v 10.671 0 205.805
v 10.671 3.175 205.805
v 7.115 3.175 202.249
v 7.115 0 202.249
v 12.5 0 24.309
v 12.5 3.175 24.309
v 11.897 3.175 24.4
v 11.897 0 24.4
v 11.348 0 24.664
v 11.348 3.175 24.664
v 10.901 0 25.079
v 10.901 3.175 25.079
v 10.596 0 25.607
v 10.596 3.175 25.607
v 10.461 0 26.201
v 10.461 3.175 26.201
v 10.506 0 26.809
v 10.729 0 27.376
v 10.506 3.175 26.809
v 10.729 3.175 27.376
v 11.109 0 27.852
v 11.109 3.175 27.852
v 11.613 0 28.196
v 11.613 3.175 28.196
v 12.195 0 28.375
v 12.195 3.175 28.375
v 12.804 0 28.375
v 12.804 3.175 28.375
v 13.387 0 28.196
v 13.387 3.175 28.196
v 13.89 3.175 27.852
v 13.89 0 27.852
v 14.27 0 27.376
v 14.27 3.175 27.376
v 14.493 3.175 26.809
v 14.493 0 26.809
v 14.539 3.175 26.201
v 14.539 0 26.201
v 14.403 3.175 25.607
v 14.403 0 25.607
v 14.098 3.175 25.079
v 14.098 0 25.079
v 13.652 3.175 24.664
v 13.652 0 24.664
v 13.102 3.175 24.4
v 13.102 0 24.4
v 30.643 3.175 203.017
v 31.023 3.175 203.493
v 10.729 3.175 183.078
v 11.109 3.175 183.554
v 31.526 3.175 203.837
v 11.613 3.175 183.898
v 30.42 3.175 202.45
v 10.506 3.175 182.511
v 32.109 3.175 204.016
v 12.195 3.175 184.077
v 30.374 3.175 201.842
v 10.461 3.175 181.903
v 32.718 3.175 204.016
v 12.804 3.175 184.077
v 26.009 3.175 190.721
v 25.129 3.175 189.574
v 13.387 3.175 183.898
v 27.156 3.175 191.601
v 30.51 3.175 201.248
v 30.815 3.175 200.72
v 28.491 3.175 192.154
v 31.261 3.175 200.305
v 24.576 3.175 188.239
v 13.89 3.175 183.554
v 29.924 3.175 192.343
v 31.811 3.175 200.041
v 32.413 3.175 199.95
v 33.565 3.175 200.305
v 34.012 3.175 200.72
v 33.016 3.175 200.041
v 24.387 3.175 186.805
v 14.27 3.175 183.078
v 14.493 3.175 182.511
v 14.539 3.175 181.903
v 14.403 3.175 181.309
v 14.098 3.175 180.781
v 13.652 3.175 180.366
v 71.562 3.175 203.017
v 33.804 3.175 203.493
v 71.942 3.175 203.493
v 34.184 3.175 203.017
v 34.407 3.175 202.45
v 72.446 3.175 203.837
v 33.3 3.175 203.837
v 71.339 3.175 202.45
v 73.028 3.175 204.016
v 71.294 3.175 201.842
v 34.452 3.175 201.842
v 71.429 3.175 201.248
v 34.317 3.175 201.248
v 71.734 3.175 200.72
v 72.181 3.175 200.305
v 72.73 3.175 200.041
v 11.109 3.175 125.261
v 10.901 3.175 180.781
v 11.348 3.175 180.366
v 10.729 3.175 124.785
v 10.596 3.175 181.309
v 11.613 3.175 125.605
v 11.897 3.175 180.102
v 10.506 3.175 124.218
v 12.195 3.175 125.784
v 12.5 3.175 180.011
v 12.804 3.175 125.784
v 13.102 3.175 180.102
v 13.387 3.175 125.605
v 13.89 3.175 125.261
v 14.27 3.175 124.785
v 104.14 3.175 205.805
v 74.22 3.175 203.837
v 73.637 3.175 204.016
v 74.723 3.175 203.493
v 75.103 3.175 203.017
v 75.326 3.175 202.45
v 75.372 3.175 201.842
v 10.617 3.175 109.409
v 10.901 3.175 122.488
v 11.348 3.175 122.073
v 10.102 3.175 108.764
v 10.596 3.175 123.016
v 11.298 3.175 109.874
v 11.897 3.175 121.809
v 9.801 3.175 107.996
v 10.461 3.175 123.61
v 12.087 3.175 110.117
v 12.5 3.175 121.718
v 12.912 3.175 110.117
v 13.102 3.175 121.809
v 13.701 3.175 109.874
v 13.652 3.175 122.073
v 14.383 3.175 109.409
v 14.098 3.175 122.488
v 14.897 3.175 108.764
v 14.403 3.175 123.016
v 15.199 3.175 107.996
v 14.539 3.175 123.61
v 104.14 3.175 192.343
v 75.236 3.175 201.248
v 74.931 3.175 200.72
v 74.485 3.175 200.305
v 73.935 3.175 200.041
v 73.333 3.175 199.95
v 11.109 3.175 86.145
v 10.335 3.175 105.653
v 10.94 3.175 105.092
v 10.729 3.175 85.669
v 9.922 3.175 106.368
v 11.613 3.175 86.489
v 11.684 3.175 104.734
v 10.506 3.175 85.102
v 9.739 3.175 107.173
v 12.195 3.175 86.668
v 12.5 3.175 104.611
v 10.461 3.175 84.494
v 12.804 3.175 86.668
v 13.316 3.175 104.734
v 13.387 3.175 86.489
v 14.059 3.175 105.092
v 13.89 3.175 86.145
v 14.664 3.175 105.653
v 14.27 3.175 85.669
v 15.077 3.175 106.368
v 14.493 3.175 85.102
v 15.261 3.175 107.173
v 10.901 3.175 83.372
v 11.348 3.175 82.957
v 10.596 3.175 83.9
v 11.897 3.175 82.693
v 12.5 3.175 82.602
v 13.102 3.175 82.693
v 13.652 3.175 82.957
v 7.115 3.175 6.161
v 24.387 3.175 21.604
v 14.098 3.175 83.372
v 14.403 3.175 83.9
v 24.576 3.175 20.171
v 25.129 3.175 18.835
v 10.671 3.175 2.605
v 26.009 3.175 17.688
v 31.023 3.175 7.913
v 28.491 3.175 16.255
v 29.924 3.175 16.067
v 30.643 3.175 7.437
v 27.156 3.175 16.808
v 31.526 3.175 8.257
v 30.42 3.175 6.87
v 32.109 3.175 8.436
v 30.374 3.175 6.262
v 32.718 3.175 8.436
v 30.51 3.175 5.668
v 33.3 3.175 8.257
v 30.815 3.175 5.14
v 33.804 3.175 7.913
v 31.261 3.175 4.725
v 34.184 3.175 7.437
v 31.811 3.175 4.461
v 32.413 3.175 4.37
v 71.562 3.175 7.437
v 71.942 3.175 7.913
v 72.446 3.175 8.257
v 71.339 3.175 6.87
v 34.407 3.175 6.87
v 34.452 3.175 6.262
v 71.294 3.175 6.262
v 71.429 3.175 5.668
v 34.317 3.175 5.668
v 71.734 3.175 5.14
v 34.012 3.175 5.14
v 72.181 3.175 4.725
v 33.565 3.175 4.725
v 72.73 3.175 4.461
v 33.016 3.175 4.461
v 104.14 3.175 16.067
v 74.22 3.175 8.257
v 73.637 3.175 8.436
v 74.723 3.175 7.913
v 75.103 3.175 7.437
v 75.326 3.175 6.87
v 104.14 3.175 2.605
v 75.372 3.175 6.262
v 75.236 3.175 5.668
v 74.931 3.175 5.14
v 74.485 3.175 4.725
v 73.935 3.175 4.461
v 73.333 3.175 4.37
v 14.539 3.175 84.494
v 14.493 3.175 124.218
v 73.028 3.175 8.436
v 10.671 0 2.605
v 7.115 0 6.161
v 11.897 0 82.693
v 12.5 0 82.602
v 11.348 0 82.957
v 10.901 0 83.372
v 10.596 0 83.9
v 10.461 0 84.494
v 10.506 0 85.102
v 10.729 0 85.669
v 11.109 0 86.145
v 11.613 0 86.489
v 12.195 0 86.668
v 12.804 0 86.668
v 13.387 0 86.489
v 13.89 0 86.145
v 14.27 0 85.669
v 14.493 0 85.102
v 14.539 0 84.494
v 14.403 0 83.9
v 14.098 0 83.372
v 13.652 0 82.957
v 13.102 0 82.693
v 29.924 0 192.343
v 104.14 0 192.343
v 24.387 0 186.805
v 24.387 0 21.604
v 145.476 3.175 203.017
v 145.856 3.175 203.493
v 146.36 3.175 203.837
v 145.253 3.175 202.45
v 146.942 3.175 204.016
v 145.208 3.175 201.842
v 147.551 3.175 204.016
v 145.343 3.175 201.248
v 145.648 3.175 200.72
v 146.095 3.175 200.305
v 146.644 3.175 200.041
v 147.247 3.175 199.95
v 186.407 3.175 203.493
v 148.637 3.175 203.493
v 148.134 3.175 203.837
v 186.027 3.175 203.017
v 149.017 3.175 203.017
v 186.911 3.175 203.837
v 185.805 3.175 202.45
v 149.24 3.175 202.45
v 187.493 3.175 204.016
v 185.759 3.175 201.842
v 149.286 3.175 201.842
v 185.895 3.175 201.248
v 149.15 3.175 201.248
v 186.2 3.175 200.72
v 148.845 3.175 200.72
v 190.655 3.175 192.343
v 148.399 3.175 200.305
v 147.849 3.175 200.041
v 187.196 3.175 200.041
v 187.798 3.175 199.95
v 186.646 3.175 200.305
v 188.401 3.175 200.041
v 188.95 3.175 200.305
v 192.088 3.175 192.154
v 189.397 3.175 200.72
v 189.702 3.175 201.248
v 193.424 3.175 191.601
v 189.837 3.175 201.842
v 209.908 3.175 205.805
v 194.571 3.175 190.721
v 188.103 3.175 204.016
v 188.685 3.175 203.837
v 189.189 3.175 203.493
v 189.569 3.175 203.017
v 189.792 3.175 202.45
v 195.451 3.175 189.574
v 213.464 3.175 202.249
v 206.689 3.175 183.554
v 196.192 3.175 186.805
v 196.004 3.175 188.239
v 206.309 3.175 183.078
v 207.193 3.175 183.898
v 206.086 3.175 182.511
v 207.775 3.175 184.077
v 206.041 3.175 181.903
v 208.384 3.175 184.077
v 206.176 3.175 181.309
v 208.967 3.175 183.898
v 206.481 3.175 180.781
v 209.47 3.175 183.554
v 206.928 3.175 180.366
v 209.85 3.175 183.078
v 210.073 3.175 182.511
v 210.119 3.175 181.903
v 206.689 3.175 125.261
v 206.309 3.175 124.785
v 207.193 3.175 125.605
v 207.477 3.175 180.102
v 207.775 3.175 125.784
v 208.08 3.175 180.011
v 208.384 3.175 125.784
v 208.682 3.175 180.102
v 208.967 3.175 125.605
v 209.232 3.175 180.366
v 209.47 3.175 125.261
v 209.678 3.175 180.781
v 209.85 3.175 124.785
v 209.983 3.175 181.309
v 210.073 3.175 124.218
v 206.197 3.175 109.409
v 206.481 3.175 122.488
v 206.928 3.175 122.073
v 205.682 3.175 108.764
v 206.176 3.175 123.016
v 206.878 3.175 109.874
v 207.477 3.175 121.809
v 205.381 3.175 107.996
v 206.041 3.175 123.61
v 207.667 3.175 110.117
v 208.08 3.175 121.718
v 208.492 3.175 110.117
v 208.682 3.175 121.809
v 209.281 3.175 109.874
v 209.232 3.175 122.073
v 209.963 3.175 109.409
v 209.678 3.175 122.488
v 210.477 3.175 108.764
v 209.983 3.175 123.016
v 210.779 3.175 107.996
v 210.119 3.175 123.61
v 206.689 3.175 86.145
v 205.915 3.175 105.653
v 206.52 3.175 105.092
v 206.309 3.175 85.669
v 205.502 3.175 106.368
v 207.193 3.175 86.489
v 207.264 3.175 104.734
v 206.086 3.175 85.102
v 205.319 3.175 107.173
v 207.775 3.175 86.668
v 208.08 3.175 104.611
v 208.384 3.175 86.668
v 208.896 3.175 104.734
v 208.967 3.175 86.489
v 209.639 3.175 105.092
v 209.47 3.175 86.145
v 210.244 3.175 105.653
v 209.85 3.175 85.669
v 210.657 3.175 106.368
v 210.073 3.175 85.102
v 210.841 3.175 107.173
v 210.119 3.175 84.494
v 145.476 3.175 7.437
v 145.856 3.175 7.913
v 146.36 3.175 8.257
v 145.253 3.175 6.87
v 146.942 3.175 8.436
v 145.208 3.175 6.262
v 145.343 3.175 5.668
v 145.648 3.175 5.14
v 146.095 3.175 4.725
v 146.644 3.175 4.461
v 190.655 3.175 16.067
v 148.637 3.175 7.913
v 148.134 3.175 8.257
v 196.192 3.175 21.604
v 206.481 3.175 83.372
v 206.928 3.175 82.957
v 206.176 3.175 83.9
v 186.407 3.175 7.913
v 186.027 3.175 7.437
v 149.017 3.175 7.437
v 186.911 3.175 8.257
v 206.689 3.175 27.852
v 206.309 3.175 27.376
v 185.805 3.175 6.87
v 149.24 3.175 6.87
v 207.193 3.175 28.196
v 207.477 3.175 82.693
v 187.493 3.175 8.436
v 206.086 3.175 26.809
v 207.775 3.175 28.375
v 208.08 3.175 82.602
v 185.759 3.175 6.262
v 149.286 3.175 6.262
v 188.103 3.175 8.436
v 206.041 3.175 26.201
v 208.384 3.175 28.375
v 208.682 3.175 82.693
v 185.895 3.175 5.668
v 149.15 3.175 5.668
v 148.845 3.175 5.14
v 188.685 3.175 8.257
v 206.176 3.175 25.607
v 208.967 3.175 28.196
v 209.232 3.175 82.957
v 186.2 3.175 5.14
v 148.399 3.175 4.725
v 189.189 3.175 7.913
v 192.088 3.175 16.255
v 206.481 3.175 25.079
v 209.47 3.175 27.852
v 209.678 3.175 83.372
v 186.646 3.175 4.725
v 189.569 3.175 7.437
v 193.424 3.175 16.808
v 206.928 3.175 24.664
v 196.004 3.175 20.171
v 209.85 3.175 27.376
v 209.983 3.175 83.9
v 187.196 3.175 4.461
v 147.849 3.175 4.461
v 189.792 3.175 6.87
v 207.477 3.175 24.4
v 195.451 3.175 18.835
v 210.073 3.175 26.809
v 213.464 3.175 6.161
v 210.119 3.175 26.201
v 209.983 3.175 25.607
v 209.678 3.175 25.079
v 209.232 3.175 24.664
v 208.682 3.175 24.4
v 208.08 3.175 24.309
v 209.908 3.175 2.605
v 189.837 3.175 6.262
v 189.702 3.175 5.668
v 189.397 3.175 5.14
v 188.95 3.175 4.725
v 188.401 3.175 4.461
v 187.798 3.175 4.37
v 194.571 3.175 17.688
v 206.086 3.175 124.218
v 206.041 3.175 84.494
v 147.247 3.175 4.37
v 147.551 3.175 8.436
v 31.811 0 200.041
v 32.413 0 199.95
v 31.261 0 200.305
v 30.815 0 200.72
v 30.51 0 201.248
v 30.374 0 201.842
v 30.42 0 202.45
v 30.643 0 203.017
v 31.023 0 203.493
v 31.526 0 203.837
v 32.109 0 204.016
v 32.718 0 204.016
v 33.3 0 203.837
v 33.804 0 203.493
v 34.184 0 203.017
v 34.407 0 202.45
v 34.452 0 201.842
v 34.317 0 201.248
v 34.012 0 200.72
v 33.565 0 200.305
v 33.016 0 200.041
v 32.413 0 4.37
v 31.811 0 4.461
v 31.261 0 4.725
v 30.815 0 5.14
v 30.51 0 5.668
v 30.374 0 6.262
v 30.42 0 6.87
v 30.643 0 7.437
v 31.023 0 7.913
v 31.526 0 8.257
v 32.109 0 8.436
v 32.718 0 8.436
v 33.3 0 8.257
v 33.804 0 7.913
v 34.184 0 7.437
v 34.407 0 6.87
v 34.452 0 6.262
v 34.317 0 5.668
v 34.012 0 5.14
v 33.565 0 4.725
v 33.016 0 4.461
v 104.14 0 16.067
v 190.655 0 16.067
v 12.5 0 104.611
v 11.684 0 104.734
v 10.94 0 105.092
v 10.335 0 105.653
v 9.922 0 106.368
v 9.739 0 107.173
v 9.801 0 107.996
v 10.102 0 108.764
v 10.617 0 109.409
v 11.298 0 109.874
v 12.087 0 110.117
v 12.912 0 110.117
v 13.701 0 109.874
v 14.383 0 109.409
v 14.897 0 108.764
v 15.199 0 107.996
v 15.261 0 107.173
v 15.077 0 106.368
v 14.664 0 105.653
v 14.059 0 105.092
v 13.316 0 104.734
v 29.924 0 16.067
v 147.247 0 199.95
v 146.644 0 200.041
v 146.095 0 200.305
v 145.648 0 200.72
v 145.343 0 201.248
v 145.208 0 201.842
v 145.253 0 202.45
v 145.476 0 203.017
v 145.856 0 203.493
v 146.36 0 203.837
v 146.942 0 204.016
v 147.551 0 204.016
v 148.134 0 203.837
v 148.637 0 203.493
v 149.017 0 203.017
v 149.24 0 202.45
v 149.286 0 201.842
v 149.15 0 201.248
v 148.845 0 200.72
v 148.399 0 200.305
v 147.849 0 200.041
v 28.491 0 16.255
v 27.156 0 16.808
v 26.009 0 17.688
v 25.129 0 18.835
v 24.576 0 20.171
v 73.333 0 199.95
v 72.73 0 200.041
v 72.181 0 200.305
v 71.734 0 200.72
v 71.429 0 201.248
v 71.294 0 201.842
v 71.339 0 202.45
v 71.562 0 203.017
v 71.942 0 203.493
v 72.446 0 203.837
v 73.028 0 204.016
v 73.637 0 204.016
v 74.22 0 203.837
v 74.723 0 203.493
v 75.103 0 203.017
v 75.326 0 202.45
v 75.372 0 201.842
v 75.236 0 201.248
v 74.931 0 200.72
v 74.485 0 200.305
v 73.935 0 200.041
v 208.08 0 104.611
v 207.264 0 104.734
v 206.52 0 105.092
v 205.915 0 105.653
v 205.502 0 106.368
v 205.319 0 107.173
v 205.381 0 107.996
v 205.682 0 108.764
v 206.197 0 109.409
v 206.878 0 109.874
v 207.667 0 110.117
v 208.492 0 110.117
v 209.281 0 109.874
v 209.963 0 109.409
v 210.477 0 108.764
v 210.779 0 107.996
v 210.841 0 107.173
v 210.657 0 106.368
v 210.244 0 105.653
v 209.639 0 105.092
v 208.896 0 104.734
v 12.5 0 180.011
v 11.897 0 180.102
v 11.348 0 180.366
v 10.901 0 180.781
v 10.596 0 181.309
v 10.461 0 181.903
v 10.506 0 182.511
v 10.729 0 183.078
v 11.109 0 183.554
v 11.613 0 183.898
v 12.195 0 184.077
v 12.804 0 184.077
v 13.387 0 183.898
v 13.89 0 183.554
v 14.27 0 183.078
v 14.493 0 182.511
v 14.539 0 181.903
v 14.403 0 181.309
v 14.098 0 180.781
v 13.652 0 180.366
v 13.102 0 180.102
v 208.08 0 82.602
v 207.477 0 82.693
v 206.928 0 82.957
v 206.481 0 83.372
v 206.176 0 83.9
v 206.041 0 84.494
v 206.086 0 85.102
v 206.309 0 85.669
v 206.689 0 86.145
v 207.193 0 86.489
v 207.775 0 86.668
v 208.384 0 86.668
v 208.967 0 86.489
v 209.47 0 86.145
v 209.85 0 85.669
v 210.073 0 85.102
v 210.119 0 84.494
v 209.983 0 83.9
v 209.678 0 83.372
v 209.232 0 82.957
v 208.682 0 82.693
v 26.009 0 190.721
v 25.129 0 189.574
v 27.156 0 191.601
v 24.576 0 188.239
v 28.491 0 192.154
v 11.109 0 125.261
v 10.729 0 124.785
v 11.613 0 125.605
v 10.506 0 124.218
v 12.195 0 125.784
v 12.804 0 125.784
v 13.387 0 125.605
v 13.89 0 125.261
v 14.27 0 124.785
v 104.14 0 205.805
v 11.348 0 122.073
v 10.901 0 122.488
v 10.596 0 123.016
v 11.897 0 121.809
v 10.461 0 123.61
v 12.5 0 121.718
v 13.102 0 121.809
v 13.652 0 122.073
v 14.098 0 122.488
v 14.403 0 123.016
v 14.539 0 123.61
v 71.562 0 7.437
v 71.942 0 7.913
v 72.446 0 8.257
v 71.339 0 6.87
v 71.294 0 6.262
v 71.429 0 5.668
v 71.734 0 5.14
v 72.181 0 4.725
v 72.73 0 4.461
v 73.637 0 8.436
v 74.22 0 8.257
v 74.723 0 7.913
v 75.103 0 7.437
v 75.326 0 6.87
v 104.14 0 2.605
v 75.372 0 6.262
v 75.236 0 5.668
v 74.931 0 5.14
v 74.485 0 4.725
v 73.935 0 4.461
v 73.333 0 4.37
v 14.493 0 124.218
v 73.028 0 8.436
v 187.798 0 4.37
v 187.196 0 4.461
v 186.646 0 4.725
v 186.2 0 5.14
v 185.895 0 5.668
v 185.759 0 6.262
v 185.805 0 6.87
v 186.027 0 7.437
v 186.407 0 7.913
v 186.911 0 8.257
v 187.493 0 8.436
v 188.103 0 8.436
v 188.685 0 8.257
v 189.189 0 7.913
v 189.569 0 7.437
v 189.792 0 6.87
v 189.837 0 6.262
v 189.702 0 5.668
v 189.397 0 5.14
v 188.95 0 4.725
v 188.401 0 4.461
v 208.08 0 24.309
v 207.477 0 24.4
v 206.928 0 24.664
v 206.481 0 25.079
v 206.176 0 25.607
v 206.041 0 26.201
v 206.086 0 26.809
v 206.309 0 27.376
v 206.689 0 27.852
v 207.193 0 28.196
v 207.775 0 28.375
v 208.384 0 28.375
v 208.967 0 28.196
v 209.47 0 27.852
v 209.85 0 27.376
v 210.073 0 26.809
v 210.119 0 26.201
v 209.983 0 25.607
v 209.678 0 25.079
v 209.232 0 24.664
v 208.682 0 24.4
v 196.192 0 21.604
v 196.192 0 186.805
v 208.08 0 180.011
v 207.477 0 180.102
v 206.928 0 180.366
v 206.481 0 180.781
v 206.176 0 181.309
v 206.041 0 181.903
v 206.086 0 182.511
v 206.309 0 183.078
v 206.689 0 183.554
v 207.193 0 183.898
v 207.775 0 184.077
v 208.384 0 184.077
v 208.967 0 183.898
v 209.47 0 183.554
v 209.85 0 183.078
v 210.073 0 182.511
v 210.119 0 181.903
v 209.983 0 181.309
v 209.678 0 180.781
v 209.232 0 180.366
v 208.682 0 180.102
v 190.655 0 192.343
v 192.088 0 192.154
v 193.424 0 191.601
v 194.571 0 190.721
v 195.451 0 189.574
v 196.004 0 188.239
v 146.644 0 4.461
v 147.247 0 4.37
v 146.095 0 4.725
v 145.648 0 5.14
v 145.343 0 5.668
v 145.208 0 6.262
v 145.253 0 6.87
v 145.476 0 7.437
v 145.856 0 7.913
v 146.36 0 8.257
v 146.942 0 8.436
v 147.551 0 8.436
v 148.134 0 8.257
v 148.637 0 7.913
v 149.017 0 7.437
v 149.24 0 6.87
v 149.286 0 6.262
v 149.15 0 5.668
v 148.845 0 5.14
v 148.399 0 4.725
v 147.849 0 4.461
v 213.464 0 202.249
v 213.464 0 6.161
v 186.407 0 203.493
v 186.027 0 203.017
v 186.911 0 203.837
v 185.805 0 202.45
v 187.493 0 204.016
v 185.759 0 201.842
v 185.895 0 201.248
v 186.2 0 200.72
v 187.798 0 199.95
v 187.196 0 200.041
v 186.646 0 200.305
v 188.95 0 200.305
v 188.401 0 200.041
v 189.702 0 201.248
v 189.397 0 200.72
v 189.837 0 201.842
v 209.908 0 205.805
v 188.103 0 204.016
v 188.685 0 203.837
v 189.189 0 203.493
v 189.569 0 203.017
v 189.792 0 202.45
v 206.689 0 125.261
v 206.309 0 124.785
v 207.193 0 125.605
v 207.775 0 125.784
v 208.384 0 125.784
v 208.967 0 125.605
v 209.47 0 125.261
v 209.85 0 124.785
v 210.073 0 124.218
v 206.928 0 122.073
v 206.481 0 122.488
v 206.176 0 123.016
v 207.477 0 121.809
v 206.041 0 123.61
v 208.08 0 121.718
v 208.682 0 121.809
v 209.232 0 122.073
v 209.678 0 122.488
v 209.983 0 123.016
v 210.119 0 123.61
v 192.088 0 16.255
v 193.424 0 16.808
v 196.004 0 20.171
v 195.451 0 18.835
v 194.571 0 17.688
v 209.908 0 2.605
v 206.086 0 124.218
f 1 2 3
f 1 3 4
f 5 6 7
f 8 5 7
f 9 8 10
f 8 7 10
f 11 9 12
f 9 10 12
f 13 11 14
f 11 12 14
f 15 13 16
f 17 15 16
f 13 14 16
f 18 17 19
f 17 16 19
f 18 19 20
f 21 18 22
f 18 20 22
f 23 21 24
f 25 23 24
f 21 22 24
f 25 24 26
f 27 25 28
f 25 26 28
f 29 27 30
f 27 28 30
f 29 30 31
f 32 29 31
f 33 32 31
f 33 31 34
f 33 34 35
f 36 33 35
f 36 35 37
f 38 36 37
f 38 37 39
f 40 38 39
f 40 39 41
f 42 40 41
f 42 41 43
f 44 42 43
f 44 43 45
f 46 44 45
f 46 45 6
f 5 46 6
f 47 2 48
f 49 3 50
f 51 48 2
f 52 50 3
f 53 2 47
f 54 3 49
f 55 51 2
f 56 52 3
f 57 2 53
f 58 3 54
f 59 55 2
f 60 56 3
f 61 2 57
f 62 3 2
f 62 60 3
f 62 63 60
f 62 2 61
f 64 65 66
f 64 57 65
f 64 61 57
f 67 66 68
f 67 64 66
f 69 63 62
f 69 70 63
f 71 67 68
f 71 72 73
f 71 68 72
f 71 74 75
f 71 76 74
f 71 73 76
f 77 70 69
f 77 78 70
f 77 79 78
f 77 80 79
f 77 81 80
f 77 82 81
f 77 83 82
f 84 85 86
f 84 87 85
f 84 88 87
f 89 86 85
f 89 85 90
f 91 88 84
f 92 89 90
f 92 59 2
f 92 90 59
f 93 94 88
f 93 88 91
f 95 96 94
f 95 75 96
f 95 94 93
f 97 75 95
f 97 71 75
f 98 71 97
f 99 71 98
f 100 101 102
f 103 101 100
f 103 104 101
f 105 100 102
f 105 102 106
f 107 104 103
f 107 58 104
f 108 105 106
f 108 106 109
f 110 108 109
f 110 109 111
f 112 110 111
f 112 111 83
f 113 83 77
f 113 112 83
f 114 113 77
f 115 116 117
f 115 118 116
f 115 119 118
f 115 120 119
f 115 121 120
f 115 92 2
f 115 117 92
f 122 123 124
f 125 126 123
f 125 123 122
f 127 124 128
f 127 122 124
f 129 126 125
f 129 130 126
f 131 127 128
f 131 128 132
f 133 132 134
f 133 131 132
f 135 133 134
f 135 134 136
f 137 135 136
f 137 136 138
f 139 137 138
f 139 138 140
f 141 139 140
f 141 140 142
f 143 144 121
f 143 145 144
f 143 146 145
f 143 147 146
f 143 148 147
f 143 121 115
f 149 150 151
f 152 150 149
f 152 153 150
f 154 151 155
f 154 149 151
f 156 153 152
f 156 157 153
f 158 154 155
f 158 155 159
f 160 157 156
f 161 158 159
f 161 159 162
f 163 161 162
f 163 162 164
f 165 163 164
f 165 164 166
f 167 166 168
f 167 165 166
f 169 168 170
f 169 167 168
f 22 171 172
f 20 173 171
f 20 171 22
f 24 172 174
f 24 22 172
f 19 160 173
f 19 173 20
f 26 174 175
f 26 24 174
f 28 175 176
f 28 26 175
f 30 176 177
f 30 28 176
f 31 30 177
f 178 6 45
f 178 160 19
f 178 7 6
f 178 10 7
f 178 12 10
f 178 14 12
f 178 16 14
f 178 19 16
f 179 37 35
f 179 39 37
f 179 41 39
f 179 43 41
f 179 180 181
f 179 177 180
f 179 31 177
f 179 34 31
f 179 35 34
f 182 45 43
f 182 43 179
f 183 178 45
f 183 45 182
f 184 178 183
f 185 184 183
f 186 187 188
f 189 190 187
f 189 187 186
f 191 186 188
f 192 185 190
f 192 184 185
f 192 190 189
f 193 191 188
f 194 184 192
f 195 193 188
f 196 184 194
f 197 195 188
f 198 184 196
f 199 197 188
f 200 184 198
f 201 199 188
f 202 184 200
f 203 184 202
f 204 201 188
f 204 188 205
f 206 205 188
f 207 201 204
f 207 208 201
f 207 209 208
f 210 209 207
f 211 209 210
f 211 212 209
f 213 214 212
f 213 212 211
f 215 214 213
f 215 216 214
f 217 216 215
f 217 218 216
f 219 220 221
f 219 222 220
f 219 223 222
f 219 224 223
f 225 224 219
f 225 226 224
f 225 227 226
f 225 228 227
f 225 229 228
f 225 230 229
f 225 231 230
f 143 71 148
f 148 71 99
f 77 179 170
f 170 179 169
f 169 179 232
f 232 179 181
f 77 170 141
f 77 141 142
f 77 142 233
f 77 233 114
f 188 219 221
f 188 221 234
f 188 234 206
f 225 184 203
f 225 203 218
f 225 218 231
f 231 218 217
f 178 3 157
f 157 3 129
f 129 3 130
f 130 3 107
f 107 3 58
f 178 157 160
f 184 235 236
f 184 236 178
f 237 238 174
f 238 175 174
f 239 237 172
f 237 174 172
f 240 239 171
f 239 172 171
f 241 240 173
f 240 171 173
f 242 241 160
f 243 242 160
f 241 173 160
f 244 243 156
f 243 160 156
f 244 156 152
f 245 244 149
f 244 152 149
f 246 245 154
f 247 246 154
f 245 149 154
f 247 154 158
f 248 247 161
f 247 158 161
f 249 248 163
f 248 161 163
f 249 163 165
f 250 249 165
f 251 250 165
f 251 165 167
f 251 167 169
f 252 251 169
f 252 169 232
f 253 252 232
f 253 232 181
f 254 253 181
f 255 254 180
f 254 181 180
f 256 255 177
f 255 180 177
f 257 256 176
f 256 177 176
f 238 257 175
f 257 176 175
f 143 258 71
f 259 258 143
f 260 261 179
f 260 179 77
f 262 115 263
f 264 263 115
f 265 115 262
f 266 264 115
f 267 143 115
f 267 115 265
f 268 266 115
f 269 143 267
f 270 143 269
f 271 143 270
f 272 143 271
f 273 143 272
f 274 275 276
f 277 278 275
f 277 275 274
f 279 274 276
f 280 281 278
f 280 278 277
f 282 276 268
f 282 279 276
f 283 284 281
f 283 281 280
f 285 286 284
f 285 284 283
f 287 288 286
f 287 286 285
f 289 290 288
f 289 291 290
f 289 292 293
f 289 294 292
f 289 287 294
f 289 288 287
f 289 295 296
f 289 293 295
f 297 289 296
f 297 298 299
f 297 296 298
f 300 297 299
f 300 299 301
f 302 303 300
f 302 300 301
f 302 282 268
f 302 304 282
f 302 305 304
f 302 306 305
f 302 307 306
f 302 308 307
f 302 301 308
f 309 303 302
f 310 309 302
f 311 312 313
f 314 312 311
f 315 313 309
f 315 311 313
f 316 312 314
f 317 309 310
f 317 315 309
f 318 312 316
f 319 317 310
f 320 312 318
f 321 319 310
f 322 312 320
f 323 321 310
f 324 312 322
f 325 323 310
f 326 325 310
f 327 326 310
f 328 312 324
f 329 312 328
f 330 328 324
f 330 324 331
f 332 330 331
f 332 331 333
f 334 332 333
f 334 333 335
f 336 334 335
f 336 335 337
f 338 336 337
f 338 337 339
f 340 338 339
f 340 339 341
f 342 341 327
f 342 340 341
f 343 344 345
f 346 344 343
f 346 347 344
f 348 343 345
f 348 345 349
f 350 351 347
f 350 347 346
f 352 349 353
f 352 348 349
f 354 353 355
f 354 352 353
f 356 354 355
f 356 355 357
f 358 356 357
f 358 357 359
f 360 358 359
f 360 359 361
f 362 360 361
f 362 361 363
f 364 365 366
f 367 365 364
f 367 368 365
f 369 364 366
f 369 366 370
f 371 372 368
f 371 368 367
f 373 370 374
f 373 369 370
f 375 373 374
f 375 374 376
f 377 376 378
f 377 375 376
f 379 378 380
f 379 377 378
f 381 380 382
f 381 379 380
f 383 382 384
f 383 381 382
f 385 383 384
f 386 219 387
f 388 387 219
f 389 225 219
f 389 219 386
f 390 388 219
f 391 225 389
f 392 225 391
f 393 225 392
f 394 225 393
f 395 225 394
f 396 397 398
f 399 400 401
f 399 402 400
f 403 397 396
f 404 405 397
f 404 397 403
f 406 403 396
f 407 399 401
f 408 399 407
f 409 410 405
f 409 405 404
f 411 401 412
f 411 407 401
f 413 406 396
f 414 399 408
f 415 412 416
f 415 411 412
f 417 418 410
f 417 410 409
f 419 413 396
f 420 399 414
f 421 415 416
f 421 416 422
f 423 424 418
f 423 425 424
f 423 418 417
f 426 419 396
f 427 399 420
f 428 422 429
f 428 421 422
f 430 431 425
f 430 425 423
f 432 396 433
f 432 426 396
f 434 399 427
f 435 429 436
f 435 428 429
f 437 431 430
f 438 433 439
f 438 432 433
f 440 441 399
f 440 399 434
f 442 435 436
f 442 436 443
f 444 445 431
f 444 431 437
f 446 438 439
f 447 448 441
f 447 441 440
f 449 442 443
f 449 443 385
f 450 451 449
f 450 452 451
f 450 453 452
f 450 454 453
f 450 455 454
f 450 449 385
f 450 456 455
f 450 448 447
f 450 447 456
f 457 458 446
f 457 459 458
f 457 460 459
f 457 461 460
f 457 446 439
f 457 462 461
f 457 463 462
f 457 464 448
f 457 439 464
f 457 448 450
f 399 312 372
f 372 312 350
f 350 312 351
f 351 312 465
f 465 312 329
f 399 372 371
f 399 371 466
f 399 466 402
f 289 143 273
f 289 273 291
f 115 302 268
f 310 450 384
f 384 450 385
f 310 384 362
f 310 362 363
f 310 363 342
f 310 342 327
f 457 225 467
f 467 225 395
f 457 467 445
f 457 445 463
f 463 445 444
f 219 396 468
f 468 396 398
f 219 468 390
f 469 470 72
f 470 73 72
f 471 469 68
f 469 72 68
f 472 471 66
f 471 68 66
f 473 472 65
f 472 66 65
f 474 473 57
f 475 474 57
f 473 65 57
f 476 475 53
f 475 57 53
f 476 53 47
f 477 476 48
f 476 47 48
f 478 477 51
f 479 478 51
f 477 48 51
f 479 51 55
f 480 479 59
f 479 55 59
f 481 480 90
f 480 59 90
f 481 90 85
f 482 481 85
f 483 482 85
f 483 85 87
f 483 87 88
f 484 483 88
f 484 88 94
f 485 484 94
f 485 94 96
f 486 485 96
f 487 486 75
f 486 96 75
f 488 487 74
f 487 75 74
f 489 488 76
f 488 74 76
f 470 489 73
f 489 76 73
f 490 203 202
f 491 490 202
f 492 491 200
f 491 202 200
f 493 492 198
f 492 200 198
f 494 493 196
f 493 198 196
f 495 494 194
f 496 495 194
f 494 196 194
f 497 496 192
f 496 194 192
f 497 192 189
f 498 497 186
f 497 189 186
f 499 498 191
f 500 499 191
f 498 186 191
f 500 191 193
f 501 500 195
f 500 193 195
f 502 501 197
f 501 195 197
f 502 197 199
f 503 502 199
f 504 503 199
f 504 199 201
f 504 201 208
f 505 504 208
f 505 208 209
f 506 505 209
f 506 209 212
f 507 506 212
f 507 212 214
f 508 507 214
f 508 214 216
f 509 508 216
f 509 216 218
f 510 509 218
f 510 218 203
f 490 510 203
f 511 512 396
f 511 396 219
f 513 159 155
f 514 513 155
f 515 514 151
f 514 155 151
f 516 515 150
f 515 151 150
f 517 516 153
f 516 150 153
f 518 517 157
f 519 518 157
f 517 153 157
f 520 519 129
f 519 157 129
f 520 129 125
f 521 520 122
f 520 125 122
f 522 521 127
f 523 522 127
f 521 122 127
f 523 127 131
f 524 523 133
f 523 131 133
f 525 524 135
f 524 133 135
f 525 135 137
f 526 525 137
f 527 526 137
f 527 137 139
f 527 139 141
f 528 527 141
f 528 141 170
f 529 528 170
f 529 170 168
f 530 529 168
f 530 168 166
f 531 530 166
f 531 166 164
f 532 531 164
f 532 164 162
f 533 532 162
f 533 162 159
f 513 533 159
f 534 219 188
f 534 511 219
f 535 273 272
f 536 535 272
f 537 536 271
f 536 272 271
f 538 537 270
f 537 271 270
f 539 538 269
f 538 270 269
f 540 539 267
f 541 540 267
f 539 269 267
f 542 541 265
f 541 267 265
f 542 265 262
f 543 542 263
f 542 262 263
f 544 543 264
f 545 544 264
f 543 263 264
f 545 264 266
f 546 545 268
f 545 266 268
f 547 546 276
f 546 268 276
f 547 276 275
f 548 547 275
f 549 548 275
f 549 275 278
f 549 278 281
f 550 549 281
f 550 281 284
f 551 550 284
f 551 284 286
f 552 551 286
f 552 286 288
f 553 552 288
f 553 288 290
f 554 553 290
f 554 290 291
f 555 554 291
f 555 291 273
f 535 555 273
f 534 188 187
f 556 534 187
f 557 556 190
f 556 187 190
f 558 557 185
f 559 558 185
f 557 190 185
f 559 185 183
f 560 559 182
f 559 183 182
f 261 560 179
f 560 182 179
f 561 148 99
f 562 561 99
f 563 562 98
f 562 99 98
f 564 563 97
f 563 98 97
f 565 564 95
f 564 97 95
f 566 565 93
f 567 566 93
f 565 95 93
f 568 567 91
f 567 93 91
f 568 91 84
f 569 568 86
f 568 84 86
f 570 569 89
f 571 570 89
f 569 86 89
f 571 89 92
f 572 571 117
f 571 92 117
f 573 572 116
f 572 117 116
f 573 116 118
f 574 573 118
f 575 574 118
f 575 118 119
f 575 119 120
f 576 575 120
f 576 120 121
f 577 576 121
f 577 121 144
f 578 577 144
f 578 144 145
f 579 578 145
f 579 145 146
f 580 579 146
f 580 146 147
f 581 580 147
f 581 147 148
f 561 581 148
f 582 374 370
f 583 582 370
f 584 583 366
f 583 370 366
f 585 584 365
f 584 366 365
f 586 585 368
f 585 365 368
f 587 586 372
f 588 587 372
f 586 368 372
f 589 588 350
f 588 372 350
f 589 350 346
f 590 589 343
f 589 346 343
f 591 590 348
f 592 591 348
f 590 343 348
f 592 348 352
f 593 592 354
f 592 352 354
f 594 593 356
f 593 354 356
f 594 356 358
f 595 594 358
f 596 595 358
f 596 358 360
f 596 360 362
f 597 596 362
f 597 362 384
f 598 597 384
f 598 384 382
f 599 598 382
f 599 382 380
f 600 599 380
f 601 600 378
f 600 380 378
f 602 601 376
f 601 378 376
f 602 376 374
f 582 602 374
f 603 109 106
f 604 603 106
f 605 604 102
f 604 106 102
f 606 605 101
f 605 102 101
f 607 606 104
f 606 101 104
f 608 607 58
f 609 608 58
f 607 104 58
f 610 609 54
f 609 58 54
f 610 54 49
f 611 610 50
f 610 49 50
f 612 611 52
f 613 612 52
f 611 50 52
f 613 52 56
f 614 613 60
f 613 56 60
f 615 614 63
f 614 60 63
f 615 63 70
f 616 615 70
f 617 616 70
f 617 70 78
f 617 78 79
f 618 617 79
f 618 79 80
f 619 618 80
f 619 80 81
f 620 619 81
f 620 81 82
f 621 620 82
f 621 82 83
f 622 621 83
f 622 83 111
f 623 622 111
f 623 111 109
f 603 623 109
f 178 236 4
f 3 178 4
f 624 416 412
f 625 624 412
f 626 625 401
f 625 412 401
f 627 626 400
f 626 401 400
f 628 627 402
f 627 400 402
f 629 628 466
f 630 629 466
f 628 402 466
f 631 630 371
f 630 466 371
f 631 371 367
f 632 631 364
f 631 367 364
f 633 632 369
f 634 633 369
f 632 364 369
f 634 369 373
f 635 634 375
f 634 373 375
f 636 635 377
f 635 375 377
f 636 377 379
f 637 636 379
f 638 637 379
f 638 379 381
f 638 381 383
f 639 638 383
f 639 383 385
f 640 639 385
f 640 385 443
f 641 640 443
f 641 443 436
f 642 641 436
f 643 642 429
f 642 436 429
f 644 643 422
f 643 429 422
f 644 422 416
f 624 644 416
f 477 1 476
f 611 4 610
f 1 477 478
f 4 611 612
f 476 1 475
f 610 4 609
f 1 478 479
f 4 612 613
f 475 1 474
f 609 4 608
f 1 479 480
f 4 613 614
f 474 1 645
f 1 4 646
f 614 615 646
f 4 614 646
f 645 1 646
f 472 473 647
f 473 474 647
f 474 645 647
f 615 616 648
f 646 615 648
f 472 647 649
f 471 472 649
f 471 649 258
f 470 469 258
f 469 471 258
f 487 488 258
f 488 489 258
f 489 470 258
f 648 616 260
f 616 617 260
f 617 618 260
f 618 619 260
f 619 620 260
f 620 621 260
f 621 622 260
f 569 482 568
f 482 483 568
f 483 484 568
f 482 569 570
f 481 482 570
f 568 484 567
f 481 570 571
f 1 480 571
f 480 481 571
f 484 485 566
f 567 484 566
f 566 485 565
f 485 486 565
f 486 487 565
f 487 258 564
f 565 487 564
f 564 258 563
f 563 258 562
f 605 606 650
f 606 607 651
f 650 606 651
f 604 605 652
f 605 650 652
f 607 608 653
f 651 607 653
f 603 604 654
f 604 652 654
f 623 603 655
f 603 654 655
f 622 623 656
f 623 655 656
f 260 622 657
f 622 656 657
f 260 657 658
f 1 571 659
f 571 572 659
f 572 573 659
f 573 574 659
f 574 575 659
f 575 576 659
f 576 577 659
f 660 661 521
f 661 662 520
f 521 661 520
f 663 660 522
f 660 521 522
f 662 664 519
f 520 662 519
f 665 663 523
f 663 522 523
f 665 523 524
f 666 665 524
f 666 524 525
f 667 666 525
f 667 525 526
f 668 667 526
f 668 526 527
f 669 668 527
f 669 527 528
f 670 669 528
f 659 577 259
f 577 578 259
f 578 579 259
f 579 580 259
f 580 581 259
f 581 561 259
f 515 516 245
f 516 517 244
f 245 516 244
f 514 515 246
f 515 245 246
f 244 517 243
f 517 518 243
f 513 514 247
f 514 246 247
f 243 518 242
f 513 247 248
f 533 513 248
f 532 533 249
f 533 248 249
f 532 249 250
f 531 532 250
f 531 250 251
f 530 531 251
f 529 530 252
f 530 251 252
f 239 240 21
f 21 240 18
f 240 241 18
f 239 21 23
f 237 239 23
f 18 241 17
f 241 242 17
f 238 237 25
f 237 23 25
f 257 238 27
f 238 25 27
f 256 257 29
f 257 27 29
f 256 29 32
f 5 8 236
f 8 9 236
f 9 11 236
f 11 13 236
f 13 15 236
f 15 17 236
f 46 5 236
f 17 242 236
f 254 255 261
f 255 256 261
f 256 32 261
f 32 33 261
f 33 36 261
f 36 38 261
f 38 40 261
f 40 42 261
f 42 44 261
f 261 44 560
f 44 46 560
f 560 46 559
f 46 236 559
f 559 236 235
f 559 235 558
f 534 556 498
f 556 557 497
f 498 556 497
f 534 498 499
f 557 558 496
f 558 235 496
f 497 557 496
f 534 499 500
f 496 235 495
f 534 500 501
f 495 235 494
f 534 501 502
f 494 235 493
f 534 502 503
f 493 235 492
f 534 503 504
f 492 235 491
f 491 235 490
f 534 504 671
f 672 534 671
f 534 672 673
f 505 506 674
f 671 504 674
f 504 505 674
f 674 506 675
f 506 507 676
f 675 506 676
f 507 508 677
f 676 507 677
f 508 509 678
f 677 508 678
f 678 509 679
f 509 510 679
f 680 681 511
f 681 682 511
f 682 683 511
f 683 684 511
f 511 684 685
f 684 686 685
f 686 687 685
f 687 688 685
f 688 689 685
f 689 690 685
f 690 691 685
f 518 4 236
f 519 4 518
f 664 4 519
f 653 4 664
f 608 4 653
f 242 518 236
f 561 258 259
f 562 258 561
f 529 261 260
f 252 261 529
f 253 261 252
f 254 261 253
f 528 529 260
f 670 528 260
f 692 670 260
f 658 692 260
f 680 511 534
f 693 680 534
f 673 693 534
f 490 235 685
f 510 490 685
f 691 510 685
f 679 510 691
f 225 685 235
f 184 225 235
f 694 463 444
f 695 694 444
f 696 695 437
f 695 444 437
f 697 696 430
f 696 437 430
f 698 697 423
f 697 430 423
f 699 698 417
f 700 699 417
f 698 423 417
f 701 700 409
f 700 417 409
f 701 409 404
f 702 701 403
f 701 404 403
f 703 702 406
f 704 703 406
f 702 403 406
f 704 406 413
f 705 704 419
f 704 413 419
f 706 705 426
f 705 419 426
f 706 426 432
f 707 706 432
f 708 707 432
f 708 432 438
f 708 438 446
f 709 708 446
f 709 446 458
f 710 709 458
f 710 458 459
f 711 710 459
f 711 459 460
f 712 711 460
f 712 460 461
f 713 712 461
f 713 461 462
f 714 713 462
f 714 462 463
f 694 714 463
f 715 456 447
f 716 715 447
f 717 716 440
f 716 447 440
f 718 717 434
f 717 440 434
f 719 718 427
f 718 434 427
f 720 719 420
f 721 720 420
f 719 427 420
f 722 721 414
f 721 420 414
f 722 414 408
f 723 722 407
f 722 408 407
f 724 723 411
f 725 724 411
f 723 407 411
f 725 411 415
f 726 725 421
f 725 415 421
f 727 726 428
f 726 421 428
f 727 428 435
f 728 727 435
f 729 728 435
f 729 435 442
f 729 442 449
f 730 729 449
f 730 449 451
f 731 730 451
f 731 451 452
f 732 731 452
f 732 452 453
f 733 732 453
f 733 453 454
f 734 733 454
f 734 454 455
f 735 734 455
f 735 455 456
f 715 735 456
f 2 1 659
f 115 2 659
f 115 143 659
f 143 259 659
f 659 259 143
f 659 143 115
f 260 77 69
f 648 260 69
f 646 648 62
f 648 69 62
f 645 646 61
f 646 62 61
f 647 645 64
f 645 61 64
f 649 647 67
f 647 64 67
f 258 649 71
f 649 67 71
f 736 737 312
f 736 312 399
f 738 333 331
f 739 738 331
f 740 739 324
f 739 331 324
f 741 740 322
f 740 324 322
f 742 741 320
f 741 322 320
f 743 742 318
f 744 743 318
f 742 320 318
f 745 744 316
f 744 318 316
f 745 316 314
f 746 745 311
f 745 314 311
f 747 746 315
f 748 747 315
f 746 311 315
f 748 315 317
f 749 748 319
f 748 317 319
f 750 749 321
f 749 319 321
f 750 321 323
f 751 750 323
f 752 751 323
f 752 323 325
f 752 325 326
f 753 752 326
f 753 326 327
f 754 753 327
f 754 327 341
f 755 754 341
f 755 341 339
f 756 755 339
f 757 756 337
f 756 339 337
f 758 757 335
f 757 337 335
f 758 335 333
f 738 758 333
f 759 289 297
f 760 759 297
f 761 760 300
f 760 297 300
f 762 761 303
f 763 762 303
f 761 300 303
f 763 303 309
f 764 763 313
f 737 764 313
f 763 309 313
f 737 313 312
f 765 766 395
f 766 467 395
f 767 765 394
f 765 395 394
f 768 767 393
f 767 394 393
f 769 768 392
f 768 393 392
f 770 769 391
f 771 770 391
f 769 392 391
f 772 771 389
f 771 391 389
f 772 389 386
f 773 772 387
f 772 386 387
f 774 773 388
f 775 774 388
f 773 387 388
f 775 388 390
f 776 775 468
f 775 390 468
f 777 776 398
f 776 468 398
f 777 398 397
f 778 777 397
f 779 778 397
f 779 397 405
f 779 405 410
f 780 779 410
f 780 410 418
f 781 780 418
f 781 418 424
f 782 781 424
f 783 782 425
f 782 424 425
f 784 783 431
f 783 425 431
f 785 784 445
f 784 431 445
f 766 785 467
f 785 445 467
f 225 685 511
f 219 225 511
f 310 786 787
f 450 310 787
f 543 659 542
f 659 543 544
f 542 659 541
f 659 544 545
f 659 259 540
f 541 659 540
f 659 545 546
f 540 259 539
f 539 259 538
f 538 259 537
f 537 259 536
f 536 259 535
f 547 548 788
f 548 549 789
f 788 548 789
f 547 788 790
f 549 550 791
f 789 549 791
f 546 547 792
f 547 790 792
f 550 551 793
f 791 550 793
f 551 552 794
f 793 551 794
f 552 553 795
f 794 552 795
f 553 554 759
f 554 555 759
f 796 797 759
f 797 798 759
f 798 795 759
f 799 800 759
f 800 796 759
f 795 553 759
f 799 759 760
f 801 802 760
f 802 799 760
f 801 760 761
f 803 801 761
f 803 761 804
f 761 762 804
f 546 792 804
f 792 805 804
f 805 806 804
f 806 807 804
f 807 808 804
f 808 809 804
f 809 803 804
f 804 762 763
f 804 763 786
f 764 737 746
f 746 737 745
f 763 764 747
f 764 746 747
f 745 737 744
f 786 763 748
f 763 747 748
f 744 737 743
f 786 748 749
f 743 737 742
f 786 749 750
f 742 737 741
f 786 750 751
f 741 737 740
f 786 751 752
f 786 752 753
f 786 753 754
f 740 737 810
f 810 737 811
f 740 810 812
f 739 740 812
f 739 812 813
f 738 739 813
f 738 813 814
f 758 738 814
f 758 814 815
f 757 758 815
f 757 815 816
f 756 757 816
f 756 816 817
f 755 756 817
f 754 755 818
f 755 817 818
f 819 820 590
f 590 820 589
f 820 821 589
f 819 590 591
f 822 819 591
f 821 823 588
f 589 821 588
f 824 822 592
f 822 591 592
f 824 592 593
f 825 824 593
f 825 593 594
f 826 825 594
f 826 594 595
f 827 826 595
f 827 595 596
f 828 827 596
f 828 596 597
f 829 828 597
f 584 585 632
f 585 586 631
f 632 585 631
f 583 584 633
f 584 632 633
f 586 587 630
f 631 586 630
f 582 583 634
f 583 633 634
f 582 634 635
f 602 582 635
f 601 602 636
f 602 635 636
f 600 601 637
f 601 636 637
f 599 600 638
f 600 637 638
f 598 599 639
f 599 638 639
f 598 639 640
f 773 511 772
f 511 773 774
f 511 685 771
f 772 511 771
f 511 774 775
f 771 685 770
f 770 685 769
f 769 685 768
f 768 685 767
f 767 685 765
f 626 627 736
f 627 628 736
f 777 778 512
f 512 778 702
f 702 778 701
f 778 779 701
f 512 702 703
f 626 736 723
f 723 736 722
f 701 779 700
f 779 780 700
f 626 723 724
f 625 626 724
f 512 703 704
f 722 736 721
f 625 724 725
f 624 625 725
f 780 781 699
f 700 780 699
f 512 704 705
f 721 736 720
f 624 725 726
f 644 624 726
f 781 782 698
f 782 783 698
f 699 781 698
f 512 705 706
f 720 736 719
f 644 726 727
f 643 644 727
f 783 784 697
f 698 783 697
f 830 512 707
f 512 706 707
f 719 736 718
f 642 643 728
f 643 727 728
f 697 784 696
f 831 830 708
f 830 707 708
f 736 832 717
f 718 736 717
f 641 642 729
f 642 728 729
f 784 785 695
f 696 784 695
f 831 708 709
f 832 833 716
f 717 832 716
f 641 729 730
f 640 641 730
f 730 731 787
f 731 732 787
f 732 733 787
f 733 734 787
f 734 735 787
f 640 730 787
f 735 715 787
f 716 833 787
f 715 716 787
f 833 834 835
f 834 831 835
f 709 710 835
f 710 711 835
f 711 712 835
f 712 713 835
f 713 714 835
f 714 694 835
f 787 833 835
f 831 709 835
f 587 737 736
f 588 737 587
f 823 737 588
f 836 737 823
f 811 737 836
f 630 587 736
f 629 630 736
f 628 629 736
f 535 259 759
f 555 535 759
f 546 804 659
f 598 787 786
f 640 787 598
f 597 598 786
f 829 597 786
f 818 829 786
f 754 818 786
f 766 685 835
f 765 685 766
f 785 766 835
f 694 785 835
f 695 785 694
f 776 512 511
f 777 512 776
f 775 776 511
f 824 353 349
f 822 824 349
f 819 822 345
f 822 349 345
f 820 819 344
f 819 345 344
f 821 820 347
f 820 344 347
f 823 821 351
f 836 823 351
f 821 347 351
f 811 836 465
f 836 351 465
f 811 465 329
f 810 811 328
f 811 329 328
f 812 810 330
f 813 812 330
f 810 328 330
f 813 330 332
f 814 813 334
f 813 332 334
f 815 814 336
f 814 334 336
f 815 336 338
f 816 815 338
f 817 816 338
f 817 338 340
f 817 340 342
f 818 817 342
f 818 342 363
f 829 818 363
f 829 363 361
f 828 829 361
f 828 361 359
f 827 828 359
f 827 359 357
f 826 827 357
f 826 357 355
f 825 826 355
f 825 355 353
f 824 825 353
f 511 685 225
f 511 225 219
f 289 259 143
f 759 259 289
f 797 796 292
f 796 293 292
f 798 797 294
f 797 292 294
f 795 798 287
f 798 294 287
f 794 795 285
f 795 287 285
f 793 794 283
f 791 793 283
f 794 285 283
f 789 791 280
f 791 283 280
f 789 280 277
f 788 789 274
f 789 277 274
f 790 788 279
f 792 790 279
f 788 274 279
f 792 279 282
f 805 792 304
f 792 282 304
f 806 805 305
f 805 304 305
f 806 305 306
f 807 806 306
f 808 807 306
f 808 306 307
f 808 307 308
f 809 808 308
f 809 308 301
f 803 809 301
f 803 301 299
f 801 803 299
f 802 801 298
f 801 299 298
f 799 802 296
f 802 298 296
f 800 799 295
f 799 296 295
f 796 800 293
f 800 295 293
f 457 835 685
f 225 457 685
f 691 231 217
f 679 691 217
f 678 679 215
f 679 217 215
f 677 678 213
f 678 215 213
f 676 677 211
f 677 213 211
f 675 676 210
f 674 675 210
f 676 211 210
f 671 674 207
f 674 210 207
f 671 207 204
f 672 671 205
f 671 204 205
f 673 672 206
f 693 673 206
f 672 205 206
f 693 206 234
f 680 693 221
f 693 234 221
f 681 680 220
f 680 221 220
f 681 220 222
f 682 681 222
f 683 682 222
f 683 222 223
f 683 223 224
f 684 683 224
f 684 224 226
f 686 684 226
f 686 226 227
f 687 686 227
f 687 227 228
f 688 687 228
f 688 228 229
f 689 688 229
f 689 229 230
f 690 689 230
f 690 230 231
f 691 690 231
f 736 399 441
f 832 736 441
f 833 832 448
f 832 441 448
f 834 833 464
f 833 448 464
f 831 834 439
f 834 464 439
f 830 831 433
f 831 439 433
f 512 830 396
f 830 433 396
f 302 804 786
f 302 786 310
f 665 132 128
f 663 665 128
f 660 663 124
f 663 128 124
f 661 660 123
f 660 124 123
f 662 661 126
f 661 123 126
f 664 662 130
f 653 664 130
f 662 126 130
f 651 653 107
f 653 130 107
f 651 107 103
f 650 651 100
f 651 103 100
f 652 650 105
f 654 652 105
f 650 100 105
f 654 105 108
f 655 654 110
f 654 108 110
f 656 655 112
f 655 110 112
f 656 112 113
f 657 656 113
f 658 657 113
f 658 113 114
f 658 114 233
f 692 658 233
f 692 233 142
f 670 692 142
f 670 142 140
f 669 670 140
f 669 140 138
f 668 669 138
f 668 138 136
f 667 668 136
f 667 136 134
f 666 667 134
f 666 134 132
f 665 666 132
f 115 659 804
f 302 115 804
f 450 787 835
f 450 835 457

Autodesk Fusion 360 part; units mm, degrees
sketch "Front" plane through (0, 0, 0) normal (0, 1, 0) x (1, 0, 0) in component "1006350A"
  line L0 (-97.5923, -201.9946) -> (221.2351, -201.9946) construction
  line L1 (-99.947, -6.4146) -> (290.3014, -6.4146) construction
  line L2 (12.4997, 61.7326) -> (12.4997, -271.4585) construction
  line L3 (208.0797, 69.9741) -> (208.0797, -187.16) construction
  line L4 (213.4645, 13.4611) -> (213.4645, -265.3363) construction
  line L5 (7.1149, -256.6239) -> (7.1149, 6.397) construction
  line L6 (-10.9391, -2.6046) -> (257.2621, -2.6046) construction
  line L7 (3.4246, -205.8046) -> (275.1579, -205.8046) construction
  line L8 (196.1925, -231.664) -> (196.1925, 4.0423) construction
  line L9 (200.5105, 72.0933) -> (200.5105, -273.8132) construction
  line L10 (20.3229, -271.4585) -> (20.3229, 19.5833) construction
  line L11 (-9.5263, -26.3536) -> (218.174, -26.3536) construction
  line L12 (-30.2477, -84.6466) -> (216.2902, -84.6466) construction
  line L13 (226.8864, -107.3796) -> (-21.2998, -107.3796) construction
  line L14 (-47.6725, -123.7626) -> (220.7641, -123.7626) construction
  line L15 (-72.1615, -182.0556) -> (219.1158, -182.0556) construction
  line L16 (-7.1716, -192.3426) -> (237.718, -192.3426) construction
  line L17 (24.3869, -243.673) -> (24.3869, 8.2807) construction
  line L18 (187.7982, 11.5773) -> (187.7982, -213.2972) construction
  line L19 (147.2467, 23.5863) -> (147.2467, -210.9425) construction
  line L20 (73.3327, 36.3018) -> (73.3327, -224.8353) construction
  line L21 (32.4133, 51.8428) -> (32.4133, -217.3002) construction
  line L22 (267.4197, -11.8756) -> (2.5805, -11.8756) construction
  line L23 (267.0325, -196.4066) -> (1.4189, -196.4066) construction
  line L24 (1.5972, -16.0666) -> (220.1148, -16.0666) construction
  line L25 (7.1149, -205.8046) -> (213.4645, -205.8046)
  line L26 (213.4645, -205.8046) -> (213.4645, -2.6046)
  line L27 (213.4645, -2.6046) -> (7.1149, -2.6046)
  line L28 (7.1149, -2.6046) -> (7.1149, -205.8046)
  line L29 (24.3869, -192.3426) -> (196.1925, -192.3426)
  line L30 (196.1925, -192.3426) -> (196.1925, -16.0666)
  line L31 (196.1925, -16.0666) -> (24.3869, -16.0666)
  line L32 (24.3869, -16.0666) -> (24.3869, -192.3426)
  point P0 (32.4133, -201.9946)
  point P1 (73.3327, -201.9946)
  point P2 (147.2467, -201.9946)
  point P3 (187.7982, -201.9946)
  point P4 (208.0797, -182.0556)
  point P5 (208.0797, -123.7626)
  point P6 (208.0797, -107.3796)
  point P7 (208.0797, -84.6466)
  point P8 (208.0797, -26.3536)
  point P9 (187.7982, -6.4146)
  point P10 (147.2467, -6.4146)
  point P11 (73.3327, -6.4146)
  point P12 (32.4133, -6.4146)
  point P13 (12.4997, -26.3536)
  point P14 (12.4997, -84.6466)
  point P15 (12.4997, -107.3796)
  point P16 (12.4997, -123.7626)
  point P17 (12.4997, -182.0556)
  dimension "d1" = 195.58
  dimension "d2" = 3.81
  dimension "d3" = 19.939
  dimension "d4" = 78.232
  dimension "d5" = 117.348
  dimension "d6" = 175.641
  dimension "d7" = 100.965
  dimension "d10" = 5.3848
  dimension "d11" = 17.272
  dimension "d12" = 60.833
  dimension "d13" = 134.747
  dimension "d14" = 175.6664
  dimension "d15" = 195.58
  dimension "d16" = 203.2
  dimension "d17" = 184.531
  dimension "d18" = 5.461
  dimension "d19" = 13.462
  dimension "d20" = 189.0776
  dimension "d21" = 206.3496
  dimension "d22" = 13.462
  dimension "d33" = 7.5692
  dimension "d34" = 180.1876
extrude "Extrude1" add sketch "Front" along normal blind 3.175 makes body 1 in component "1006350A"
chamfer "Chamfer1" distance 3.556 angle 45 4 edges at (7.1149, 1.5875, 205.8046) (213.4645, 1.5875, 205.8046) (213.4645, 1.5875, 2.6046) (7.1149, 1.5875, 2.6046) on bodies 1 in component "1006350A"
fillet "Fillet1" radius 5.5372 4 edges at (196.1925, 1.5875, 192.3426) (24.3869, 1.5875, 192.3426) (24.3869, 1.5875, 16.0666) (196.1925, 1.5875, 16.0666) on bodies 1 in component "1006350A"
hole "Hole1" at (12.4997, 0, 107.3796) at (208.0797, 0, 107.3796) direction (0, 1, 0) diameter 5.5372 end through all bodies 1 1 in component "1006350A"
hole "Hole2" at (147.2467, 0, 201.9946) at (187.7982, 0, 201.9946) at (208.0797, 0, 182.0556) at (208.0797, 0, 123.7626) at (73.3327, 0, 201.9946) at (32.4133, 0, 201.9946) at (12.4997, 0, 182.0556) at (12.4997, 0, 123.7626) at (12.4997, 0, 84.6466) at (12.4997, 0, 26.3536) at (32.4133, 0, 6.4146) at (73.3327, 0, 6.4146) at (147.2467, 0, 6.4146) at (187.7982, 0, 6.4146) at (208.0797, 0, 26.3536) at (208.0797, 0, 84.6466) direction (0, 1, 0) diameter 4.0894 end through all bodies 1 1 in component "1006350A"
ref_plane "WorkPlane1" through (104.14, 0, 0) normal (1, 0, 0) x (0, 1, 0)
split "Split1" by plane through (104.14, 0, 0) normal (1, 0, 0) bodies 1 makes body 2 at (117.8444, 0, 199.8956) in component "1006350A"
component "1006350A" placed x (1, 0, 0) y (0, 1, 0) z (0, 0, 1) at (0, 0, 0)
